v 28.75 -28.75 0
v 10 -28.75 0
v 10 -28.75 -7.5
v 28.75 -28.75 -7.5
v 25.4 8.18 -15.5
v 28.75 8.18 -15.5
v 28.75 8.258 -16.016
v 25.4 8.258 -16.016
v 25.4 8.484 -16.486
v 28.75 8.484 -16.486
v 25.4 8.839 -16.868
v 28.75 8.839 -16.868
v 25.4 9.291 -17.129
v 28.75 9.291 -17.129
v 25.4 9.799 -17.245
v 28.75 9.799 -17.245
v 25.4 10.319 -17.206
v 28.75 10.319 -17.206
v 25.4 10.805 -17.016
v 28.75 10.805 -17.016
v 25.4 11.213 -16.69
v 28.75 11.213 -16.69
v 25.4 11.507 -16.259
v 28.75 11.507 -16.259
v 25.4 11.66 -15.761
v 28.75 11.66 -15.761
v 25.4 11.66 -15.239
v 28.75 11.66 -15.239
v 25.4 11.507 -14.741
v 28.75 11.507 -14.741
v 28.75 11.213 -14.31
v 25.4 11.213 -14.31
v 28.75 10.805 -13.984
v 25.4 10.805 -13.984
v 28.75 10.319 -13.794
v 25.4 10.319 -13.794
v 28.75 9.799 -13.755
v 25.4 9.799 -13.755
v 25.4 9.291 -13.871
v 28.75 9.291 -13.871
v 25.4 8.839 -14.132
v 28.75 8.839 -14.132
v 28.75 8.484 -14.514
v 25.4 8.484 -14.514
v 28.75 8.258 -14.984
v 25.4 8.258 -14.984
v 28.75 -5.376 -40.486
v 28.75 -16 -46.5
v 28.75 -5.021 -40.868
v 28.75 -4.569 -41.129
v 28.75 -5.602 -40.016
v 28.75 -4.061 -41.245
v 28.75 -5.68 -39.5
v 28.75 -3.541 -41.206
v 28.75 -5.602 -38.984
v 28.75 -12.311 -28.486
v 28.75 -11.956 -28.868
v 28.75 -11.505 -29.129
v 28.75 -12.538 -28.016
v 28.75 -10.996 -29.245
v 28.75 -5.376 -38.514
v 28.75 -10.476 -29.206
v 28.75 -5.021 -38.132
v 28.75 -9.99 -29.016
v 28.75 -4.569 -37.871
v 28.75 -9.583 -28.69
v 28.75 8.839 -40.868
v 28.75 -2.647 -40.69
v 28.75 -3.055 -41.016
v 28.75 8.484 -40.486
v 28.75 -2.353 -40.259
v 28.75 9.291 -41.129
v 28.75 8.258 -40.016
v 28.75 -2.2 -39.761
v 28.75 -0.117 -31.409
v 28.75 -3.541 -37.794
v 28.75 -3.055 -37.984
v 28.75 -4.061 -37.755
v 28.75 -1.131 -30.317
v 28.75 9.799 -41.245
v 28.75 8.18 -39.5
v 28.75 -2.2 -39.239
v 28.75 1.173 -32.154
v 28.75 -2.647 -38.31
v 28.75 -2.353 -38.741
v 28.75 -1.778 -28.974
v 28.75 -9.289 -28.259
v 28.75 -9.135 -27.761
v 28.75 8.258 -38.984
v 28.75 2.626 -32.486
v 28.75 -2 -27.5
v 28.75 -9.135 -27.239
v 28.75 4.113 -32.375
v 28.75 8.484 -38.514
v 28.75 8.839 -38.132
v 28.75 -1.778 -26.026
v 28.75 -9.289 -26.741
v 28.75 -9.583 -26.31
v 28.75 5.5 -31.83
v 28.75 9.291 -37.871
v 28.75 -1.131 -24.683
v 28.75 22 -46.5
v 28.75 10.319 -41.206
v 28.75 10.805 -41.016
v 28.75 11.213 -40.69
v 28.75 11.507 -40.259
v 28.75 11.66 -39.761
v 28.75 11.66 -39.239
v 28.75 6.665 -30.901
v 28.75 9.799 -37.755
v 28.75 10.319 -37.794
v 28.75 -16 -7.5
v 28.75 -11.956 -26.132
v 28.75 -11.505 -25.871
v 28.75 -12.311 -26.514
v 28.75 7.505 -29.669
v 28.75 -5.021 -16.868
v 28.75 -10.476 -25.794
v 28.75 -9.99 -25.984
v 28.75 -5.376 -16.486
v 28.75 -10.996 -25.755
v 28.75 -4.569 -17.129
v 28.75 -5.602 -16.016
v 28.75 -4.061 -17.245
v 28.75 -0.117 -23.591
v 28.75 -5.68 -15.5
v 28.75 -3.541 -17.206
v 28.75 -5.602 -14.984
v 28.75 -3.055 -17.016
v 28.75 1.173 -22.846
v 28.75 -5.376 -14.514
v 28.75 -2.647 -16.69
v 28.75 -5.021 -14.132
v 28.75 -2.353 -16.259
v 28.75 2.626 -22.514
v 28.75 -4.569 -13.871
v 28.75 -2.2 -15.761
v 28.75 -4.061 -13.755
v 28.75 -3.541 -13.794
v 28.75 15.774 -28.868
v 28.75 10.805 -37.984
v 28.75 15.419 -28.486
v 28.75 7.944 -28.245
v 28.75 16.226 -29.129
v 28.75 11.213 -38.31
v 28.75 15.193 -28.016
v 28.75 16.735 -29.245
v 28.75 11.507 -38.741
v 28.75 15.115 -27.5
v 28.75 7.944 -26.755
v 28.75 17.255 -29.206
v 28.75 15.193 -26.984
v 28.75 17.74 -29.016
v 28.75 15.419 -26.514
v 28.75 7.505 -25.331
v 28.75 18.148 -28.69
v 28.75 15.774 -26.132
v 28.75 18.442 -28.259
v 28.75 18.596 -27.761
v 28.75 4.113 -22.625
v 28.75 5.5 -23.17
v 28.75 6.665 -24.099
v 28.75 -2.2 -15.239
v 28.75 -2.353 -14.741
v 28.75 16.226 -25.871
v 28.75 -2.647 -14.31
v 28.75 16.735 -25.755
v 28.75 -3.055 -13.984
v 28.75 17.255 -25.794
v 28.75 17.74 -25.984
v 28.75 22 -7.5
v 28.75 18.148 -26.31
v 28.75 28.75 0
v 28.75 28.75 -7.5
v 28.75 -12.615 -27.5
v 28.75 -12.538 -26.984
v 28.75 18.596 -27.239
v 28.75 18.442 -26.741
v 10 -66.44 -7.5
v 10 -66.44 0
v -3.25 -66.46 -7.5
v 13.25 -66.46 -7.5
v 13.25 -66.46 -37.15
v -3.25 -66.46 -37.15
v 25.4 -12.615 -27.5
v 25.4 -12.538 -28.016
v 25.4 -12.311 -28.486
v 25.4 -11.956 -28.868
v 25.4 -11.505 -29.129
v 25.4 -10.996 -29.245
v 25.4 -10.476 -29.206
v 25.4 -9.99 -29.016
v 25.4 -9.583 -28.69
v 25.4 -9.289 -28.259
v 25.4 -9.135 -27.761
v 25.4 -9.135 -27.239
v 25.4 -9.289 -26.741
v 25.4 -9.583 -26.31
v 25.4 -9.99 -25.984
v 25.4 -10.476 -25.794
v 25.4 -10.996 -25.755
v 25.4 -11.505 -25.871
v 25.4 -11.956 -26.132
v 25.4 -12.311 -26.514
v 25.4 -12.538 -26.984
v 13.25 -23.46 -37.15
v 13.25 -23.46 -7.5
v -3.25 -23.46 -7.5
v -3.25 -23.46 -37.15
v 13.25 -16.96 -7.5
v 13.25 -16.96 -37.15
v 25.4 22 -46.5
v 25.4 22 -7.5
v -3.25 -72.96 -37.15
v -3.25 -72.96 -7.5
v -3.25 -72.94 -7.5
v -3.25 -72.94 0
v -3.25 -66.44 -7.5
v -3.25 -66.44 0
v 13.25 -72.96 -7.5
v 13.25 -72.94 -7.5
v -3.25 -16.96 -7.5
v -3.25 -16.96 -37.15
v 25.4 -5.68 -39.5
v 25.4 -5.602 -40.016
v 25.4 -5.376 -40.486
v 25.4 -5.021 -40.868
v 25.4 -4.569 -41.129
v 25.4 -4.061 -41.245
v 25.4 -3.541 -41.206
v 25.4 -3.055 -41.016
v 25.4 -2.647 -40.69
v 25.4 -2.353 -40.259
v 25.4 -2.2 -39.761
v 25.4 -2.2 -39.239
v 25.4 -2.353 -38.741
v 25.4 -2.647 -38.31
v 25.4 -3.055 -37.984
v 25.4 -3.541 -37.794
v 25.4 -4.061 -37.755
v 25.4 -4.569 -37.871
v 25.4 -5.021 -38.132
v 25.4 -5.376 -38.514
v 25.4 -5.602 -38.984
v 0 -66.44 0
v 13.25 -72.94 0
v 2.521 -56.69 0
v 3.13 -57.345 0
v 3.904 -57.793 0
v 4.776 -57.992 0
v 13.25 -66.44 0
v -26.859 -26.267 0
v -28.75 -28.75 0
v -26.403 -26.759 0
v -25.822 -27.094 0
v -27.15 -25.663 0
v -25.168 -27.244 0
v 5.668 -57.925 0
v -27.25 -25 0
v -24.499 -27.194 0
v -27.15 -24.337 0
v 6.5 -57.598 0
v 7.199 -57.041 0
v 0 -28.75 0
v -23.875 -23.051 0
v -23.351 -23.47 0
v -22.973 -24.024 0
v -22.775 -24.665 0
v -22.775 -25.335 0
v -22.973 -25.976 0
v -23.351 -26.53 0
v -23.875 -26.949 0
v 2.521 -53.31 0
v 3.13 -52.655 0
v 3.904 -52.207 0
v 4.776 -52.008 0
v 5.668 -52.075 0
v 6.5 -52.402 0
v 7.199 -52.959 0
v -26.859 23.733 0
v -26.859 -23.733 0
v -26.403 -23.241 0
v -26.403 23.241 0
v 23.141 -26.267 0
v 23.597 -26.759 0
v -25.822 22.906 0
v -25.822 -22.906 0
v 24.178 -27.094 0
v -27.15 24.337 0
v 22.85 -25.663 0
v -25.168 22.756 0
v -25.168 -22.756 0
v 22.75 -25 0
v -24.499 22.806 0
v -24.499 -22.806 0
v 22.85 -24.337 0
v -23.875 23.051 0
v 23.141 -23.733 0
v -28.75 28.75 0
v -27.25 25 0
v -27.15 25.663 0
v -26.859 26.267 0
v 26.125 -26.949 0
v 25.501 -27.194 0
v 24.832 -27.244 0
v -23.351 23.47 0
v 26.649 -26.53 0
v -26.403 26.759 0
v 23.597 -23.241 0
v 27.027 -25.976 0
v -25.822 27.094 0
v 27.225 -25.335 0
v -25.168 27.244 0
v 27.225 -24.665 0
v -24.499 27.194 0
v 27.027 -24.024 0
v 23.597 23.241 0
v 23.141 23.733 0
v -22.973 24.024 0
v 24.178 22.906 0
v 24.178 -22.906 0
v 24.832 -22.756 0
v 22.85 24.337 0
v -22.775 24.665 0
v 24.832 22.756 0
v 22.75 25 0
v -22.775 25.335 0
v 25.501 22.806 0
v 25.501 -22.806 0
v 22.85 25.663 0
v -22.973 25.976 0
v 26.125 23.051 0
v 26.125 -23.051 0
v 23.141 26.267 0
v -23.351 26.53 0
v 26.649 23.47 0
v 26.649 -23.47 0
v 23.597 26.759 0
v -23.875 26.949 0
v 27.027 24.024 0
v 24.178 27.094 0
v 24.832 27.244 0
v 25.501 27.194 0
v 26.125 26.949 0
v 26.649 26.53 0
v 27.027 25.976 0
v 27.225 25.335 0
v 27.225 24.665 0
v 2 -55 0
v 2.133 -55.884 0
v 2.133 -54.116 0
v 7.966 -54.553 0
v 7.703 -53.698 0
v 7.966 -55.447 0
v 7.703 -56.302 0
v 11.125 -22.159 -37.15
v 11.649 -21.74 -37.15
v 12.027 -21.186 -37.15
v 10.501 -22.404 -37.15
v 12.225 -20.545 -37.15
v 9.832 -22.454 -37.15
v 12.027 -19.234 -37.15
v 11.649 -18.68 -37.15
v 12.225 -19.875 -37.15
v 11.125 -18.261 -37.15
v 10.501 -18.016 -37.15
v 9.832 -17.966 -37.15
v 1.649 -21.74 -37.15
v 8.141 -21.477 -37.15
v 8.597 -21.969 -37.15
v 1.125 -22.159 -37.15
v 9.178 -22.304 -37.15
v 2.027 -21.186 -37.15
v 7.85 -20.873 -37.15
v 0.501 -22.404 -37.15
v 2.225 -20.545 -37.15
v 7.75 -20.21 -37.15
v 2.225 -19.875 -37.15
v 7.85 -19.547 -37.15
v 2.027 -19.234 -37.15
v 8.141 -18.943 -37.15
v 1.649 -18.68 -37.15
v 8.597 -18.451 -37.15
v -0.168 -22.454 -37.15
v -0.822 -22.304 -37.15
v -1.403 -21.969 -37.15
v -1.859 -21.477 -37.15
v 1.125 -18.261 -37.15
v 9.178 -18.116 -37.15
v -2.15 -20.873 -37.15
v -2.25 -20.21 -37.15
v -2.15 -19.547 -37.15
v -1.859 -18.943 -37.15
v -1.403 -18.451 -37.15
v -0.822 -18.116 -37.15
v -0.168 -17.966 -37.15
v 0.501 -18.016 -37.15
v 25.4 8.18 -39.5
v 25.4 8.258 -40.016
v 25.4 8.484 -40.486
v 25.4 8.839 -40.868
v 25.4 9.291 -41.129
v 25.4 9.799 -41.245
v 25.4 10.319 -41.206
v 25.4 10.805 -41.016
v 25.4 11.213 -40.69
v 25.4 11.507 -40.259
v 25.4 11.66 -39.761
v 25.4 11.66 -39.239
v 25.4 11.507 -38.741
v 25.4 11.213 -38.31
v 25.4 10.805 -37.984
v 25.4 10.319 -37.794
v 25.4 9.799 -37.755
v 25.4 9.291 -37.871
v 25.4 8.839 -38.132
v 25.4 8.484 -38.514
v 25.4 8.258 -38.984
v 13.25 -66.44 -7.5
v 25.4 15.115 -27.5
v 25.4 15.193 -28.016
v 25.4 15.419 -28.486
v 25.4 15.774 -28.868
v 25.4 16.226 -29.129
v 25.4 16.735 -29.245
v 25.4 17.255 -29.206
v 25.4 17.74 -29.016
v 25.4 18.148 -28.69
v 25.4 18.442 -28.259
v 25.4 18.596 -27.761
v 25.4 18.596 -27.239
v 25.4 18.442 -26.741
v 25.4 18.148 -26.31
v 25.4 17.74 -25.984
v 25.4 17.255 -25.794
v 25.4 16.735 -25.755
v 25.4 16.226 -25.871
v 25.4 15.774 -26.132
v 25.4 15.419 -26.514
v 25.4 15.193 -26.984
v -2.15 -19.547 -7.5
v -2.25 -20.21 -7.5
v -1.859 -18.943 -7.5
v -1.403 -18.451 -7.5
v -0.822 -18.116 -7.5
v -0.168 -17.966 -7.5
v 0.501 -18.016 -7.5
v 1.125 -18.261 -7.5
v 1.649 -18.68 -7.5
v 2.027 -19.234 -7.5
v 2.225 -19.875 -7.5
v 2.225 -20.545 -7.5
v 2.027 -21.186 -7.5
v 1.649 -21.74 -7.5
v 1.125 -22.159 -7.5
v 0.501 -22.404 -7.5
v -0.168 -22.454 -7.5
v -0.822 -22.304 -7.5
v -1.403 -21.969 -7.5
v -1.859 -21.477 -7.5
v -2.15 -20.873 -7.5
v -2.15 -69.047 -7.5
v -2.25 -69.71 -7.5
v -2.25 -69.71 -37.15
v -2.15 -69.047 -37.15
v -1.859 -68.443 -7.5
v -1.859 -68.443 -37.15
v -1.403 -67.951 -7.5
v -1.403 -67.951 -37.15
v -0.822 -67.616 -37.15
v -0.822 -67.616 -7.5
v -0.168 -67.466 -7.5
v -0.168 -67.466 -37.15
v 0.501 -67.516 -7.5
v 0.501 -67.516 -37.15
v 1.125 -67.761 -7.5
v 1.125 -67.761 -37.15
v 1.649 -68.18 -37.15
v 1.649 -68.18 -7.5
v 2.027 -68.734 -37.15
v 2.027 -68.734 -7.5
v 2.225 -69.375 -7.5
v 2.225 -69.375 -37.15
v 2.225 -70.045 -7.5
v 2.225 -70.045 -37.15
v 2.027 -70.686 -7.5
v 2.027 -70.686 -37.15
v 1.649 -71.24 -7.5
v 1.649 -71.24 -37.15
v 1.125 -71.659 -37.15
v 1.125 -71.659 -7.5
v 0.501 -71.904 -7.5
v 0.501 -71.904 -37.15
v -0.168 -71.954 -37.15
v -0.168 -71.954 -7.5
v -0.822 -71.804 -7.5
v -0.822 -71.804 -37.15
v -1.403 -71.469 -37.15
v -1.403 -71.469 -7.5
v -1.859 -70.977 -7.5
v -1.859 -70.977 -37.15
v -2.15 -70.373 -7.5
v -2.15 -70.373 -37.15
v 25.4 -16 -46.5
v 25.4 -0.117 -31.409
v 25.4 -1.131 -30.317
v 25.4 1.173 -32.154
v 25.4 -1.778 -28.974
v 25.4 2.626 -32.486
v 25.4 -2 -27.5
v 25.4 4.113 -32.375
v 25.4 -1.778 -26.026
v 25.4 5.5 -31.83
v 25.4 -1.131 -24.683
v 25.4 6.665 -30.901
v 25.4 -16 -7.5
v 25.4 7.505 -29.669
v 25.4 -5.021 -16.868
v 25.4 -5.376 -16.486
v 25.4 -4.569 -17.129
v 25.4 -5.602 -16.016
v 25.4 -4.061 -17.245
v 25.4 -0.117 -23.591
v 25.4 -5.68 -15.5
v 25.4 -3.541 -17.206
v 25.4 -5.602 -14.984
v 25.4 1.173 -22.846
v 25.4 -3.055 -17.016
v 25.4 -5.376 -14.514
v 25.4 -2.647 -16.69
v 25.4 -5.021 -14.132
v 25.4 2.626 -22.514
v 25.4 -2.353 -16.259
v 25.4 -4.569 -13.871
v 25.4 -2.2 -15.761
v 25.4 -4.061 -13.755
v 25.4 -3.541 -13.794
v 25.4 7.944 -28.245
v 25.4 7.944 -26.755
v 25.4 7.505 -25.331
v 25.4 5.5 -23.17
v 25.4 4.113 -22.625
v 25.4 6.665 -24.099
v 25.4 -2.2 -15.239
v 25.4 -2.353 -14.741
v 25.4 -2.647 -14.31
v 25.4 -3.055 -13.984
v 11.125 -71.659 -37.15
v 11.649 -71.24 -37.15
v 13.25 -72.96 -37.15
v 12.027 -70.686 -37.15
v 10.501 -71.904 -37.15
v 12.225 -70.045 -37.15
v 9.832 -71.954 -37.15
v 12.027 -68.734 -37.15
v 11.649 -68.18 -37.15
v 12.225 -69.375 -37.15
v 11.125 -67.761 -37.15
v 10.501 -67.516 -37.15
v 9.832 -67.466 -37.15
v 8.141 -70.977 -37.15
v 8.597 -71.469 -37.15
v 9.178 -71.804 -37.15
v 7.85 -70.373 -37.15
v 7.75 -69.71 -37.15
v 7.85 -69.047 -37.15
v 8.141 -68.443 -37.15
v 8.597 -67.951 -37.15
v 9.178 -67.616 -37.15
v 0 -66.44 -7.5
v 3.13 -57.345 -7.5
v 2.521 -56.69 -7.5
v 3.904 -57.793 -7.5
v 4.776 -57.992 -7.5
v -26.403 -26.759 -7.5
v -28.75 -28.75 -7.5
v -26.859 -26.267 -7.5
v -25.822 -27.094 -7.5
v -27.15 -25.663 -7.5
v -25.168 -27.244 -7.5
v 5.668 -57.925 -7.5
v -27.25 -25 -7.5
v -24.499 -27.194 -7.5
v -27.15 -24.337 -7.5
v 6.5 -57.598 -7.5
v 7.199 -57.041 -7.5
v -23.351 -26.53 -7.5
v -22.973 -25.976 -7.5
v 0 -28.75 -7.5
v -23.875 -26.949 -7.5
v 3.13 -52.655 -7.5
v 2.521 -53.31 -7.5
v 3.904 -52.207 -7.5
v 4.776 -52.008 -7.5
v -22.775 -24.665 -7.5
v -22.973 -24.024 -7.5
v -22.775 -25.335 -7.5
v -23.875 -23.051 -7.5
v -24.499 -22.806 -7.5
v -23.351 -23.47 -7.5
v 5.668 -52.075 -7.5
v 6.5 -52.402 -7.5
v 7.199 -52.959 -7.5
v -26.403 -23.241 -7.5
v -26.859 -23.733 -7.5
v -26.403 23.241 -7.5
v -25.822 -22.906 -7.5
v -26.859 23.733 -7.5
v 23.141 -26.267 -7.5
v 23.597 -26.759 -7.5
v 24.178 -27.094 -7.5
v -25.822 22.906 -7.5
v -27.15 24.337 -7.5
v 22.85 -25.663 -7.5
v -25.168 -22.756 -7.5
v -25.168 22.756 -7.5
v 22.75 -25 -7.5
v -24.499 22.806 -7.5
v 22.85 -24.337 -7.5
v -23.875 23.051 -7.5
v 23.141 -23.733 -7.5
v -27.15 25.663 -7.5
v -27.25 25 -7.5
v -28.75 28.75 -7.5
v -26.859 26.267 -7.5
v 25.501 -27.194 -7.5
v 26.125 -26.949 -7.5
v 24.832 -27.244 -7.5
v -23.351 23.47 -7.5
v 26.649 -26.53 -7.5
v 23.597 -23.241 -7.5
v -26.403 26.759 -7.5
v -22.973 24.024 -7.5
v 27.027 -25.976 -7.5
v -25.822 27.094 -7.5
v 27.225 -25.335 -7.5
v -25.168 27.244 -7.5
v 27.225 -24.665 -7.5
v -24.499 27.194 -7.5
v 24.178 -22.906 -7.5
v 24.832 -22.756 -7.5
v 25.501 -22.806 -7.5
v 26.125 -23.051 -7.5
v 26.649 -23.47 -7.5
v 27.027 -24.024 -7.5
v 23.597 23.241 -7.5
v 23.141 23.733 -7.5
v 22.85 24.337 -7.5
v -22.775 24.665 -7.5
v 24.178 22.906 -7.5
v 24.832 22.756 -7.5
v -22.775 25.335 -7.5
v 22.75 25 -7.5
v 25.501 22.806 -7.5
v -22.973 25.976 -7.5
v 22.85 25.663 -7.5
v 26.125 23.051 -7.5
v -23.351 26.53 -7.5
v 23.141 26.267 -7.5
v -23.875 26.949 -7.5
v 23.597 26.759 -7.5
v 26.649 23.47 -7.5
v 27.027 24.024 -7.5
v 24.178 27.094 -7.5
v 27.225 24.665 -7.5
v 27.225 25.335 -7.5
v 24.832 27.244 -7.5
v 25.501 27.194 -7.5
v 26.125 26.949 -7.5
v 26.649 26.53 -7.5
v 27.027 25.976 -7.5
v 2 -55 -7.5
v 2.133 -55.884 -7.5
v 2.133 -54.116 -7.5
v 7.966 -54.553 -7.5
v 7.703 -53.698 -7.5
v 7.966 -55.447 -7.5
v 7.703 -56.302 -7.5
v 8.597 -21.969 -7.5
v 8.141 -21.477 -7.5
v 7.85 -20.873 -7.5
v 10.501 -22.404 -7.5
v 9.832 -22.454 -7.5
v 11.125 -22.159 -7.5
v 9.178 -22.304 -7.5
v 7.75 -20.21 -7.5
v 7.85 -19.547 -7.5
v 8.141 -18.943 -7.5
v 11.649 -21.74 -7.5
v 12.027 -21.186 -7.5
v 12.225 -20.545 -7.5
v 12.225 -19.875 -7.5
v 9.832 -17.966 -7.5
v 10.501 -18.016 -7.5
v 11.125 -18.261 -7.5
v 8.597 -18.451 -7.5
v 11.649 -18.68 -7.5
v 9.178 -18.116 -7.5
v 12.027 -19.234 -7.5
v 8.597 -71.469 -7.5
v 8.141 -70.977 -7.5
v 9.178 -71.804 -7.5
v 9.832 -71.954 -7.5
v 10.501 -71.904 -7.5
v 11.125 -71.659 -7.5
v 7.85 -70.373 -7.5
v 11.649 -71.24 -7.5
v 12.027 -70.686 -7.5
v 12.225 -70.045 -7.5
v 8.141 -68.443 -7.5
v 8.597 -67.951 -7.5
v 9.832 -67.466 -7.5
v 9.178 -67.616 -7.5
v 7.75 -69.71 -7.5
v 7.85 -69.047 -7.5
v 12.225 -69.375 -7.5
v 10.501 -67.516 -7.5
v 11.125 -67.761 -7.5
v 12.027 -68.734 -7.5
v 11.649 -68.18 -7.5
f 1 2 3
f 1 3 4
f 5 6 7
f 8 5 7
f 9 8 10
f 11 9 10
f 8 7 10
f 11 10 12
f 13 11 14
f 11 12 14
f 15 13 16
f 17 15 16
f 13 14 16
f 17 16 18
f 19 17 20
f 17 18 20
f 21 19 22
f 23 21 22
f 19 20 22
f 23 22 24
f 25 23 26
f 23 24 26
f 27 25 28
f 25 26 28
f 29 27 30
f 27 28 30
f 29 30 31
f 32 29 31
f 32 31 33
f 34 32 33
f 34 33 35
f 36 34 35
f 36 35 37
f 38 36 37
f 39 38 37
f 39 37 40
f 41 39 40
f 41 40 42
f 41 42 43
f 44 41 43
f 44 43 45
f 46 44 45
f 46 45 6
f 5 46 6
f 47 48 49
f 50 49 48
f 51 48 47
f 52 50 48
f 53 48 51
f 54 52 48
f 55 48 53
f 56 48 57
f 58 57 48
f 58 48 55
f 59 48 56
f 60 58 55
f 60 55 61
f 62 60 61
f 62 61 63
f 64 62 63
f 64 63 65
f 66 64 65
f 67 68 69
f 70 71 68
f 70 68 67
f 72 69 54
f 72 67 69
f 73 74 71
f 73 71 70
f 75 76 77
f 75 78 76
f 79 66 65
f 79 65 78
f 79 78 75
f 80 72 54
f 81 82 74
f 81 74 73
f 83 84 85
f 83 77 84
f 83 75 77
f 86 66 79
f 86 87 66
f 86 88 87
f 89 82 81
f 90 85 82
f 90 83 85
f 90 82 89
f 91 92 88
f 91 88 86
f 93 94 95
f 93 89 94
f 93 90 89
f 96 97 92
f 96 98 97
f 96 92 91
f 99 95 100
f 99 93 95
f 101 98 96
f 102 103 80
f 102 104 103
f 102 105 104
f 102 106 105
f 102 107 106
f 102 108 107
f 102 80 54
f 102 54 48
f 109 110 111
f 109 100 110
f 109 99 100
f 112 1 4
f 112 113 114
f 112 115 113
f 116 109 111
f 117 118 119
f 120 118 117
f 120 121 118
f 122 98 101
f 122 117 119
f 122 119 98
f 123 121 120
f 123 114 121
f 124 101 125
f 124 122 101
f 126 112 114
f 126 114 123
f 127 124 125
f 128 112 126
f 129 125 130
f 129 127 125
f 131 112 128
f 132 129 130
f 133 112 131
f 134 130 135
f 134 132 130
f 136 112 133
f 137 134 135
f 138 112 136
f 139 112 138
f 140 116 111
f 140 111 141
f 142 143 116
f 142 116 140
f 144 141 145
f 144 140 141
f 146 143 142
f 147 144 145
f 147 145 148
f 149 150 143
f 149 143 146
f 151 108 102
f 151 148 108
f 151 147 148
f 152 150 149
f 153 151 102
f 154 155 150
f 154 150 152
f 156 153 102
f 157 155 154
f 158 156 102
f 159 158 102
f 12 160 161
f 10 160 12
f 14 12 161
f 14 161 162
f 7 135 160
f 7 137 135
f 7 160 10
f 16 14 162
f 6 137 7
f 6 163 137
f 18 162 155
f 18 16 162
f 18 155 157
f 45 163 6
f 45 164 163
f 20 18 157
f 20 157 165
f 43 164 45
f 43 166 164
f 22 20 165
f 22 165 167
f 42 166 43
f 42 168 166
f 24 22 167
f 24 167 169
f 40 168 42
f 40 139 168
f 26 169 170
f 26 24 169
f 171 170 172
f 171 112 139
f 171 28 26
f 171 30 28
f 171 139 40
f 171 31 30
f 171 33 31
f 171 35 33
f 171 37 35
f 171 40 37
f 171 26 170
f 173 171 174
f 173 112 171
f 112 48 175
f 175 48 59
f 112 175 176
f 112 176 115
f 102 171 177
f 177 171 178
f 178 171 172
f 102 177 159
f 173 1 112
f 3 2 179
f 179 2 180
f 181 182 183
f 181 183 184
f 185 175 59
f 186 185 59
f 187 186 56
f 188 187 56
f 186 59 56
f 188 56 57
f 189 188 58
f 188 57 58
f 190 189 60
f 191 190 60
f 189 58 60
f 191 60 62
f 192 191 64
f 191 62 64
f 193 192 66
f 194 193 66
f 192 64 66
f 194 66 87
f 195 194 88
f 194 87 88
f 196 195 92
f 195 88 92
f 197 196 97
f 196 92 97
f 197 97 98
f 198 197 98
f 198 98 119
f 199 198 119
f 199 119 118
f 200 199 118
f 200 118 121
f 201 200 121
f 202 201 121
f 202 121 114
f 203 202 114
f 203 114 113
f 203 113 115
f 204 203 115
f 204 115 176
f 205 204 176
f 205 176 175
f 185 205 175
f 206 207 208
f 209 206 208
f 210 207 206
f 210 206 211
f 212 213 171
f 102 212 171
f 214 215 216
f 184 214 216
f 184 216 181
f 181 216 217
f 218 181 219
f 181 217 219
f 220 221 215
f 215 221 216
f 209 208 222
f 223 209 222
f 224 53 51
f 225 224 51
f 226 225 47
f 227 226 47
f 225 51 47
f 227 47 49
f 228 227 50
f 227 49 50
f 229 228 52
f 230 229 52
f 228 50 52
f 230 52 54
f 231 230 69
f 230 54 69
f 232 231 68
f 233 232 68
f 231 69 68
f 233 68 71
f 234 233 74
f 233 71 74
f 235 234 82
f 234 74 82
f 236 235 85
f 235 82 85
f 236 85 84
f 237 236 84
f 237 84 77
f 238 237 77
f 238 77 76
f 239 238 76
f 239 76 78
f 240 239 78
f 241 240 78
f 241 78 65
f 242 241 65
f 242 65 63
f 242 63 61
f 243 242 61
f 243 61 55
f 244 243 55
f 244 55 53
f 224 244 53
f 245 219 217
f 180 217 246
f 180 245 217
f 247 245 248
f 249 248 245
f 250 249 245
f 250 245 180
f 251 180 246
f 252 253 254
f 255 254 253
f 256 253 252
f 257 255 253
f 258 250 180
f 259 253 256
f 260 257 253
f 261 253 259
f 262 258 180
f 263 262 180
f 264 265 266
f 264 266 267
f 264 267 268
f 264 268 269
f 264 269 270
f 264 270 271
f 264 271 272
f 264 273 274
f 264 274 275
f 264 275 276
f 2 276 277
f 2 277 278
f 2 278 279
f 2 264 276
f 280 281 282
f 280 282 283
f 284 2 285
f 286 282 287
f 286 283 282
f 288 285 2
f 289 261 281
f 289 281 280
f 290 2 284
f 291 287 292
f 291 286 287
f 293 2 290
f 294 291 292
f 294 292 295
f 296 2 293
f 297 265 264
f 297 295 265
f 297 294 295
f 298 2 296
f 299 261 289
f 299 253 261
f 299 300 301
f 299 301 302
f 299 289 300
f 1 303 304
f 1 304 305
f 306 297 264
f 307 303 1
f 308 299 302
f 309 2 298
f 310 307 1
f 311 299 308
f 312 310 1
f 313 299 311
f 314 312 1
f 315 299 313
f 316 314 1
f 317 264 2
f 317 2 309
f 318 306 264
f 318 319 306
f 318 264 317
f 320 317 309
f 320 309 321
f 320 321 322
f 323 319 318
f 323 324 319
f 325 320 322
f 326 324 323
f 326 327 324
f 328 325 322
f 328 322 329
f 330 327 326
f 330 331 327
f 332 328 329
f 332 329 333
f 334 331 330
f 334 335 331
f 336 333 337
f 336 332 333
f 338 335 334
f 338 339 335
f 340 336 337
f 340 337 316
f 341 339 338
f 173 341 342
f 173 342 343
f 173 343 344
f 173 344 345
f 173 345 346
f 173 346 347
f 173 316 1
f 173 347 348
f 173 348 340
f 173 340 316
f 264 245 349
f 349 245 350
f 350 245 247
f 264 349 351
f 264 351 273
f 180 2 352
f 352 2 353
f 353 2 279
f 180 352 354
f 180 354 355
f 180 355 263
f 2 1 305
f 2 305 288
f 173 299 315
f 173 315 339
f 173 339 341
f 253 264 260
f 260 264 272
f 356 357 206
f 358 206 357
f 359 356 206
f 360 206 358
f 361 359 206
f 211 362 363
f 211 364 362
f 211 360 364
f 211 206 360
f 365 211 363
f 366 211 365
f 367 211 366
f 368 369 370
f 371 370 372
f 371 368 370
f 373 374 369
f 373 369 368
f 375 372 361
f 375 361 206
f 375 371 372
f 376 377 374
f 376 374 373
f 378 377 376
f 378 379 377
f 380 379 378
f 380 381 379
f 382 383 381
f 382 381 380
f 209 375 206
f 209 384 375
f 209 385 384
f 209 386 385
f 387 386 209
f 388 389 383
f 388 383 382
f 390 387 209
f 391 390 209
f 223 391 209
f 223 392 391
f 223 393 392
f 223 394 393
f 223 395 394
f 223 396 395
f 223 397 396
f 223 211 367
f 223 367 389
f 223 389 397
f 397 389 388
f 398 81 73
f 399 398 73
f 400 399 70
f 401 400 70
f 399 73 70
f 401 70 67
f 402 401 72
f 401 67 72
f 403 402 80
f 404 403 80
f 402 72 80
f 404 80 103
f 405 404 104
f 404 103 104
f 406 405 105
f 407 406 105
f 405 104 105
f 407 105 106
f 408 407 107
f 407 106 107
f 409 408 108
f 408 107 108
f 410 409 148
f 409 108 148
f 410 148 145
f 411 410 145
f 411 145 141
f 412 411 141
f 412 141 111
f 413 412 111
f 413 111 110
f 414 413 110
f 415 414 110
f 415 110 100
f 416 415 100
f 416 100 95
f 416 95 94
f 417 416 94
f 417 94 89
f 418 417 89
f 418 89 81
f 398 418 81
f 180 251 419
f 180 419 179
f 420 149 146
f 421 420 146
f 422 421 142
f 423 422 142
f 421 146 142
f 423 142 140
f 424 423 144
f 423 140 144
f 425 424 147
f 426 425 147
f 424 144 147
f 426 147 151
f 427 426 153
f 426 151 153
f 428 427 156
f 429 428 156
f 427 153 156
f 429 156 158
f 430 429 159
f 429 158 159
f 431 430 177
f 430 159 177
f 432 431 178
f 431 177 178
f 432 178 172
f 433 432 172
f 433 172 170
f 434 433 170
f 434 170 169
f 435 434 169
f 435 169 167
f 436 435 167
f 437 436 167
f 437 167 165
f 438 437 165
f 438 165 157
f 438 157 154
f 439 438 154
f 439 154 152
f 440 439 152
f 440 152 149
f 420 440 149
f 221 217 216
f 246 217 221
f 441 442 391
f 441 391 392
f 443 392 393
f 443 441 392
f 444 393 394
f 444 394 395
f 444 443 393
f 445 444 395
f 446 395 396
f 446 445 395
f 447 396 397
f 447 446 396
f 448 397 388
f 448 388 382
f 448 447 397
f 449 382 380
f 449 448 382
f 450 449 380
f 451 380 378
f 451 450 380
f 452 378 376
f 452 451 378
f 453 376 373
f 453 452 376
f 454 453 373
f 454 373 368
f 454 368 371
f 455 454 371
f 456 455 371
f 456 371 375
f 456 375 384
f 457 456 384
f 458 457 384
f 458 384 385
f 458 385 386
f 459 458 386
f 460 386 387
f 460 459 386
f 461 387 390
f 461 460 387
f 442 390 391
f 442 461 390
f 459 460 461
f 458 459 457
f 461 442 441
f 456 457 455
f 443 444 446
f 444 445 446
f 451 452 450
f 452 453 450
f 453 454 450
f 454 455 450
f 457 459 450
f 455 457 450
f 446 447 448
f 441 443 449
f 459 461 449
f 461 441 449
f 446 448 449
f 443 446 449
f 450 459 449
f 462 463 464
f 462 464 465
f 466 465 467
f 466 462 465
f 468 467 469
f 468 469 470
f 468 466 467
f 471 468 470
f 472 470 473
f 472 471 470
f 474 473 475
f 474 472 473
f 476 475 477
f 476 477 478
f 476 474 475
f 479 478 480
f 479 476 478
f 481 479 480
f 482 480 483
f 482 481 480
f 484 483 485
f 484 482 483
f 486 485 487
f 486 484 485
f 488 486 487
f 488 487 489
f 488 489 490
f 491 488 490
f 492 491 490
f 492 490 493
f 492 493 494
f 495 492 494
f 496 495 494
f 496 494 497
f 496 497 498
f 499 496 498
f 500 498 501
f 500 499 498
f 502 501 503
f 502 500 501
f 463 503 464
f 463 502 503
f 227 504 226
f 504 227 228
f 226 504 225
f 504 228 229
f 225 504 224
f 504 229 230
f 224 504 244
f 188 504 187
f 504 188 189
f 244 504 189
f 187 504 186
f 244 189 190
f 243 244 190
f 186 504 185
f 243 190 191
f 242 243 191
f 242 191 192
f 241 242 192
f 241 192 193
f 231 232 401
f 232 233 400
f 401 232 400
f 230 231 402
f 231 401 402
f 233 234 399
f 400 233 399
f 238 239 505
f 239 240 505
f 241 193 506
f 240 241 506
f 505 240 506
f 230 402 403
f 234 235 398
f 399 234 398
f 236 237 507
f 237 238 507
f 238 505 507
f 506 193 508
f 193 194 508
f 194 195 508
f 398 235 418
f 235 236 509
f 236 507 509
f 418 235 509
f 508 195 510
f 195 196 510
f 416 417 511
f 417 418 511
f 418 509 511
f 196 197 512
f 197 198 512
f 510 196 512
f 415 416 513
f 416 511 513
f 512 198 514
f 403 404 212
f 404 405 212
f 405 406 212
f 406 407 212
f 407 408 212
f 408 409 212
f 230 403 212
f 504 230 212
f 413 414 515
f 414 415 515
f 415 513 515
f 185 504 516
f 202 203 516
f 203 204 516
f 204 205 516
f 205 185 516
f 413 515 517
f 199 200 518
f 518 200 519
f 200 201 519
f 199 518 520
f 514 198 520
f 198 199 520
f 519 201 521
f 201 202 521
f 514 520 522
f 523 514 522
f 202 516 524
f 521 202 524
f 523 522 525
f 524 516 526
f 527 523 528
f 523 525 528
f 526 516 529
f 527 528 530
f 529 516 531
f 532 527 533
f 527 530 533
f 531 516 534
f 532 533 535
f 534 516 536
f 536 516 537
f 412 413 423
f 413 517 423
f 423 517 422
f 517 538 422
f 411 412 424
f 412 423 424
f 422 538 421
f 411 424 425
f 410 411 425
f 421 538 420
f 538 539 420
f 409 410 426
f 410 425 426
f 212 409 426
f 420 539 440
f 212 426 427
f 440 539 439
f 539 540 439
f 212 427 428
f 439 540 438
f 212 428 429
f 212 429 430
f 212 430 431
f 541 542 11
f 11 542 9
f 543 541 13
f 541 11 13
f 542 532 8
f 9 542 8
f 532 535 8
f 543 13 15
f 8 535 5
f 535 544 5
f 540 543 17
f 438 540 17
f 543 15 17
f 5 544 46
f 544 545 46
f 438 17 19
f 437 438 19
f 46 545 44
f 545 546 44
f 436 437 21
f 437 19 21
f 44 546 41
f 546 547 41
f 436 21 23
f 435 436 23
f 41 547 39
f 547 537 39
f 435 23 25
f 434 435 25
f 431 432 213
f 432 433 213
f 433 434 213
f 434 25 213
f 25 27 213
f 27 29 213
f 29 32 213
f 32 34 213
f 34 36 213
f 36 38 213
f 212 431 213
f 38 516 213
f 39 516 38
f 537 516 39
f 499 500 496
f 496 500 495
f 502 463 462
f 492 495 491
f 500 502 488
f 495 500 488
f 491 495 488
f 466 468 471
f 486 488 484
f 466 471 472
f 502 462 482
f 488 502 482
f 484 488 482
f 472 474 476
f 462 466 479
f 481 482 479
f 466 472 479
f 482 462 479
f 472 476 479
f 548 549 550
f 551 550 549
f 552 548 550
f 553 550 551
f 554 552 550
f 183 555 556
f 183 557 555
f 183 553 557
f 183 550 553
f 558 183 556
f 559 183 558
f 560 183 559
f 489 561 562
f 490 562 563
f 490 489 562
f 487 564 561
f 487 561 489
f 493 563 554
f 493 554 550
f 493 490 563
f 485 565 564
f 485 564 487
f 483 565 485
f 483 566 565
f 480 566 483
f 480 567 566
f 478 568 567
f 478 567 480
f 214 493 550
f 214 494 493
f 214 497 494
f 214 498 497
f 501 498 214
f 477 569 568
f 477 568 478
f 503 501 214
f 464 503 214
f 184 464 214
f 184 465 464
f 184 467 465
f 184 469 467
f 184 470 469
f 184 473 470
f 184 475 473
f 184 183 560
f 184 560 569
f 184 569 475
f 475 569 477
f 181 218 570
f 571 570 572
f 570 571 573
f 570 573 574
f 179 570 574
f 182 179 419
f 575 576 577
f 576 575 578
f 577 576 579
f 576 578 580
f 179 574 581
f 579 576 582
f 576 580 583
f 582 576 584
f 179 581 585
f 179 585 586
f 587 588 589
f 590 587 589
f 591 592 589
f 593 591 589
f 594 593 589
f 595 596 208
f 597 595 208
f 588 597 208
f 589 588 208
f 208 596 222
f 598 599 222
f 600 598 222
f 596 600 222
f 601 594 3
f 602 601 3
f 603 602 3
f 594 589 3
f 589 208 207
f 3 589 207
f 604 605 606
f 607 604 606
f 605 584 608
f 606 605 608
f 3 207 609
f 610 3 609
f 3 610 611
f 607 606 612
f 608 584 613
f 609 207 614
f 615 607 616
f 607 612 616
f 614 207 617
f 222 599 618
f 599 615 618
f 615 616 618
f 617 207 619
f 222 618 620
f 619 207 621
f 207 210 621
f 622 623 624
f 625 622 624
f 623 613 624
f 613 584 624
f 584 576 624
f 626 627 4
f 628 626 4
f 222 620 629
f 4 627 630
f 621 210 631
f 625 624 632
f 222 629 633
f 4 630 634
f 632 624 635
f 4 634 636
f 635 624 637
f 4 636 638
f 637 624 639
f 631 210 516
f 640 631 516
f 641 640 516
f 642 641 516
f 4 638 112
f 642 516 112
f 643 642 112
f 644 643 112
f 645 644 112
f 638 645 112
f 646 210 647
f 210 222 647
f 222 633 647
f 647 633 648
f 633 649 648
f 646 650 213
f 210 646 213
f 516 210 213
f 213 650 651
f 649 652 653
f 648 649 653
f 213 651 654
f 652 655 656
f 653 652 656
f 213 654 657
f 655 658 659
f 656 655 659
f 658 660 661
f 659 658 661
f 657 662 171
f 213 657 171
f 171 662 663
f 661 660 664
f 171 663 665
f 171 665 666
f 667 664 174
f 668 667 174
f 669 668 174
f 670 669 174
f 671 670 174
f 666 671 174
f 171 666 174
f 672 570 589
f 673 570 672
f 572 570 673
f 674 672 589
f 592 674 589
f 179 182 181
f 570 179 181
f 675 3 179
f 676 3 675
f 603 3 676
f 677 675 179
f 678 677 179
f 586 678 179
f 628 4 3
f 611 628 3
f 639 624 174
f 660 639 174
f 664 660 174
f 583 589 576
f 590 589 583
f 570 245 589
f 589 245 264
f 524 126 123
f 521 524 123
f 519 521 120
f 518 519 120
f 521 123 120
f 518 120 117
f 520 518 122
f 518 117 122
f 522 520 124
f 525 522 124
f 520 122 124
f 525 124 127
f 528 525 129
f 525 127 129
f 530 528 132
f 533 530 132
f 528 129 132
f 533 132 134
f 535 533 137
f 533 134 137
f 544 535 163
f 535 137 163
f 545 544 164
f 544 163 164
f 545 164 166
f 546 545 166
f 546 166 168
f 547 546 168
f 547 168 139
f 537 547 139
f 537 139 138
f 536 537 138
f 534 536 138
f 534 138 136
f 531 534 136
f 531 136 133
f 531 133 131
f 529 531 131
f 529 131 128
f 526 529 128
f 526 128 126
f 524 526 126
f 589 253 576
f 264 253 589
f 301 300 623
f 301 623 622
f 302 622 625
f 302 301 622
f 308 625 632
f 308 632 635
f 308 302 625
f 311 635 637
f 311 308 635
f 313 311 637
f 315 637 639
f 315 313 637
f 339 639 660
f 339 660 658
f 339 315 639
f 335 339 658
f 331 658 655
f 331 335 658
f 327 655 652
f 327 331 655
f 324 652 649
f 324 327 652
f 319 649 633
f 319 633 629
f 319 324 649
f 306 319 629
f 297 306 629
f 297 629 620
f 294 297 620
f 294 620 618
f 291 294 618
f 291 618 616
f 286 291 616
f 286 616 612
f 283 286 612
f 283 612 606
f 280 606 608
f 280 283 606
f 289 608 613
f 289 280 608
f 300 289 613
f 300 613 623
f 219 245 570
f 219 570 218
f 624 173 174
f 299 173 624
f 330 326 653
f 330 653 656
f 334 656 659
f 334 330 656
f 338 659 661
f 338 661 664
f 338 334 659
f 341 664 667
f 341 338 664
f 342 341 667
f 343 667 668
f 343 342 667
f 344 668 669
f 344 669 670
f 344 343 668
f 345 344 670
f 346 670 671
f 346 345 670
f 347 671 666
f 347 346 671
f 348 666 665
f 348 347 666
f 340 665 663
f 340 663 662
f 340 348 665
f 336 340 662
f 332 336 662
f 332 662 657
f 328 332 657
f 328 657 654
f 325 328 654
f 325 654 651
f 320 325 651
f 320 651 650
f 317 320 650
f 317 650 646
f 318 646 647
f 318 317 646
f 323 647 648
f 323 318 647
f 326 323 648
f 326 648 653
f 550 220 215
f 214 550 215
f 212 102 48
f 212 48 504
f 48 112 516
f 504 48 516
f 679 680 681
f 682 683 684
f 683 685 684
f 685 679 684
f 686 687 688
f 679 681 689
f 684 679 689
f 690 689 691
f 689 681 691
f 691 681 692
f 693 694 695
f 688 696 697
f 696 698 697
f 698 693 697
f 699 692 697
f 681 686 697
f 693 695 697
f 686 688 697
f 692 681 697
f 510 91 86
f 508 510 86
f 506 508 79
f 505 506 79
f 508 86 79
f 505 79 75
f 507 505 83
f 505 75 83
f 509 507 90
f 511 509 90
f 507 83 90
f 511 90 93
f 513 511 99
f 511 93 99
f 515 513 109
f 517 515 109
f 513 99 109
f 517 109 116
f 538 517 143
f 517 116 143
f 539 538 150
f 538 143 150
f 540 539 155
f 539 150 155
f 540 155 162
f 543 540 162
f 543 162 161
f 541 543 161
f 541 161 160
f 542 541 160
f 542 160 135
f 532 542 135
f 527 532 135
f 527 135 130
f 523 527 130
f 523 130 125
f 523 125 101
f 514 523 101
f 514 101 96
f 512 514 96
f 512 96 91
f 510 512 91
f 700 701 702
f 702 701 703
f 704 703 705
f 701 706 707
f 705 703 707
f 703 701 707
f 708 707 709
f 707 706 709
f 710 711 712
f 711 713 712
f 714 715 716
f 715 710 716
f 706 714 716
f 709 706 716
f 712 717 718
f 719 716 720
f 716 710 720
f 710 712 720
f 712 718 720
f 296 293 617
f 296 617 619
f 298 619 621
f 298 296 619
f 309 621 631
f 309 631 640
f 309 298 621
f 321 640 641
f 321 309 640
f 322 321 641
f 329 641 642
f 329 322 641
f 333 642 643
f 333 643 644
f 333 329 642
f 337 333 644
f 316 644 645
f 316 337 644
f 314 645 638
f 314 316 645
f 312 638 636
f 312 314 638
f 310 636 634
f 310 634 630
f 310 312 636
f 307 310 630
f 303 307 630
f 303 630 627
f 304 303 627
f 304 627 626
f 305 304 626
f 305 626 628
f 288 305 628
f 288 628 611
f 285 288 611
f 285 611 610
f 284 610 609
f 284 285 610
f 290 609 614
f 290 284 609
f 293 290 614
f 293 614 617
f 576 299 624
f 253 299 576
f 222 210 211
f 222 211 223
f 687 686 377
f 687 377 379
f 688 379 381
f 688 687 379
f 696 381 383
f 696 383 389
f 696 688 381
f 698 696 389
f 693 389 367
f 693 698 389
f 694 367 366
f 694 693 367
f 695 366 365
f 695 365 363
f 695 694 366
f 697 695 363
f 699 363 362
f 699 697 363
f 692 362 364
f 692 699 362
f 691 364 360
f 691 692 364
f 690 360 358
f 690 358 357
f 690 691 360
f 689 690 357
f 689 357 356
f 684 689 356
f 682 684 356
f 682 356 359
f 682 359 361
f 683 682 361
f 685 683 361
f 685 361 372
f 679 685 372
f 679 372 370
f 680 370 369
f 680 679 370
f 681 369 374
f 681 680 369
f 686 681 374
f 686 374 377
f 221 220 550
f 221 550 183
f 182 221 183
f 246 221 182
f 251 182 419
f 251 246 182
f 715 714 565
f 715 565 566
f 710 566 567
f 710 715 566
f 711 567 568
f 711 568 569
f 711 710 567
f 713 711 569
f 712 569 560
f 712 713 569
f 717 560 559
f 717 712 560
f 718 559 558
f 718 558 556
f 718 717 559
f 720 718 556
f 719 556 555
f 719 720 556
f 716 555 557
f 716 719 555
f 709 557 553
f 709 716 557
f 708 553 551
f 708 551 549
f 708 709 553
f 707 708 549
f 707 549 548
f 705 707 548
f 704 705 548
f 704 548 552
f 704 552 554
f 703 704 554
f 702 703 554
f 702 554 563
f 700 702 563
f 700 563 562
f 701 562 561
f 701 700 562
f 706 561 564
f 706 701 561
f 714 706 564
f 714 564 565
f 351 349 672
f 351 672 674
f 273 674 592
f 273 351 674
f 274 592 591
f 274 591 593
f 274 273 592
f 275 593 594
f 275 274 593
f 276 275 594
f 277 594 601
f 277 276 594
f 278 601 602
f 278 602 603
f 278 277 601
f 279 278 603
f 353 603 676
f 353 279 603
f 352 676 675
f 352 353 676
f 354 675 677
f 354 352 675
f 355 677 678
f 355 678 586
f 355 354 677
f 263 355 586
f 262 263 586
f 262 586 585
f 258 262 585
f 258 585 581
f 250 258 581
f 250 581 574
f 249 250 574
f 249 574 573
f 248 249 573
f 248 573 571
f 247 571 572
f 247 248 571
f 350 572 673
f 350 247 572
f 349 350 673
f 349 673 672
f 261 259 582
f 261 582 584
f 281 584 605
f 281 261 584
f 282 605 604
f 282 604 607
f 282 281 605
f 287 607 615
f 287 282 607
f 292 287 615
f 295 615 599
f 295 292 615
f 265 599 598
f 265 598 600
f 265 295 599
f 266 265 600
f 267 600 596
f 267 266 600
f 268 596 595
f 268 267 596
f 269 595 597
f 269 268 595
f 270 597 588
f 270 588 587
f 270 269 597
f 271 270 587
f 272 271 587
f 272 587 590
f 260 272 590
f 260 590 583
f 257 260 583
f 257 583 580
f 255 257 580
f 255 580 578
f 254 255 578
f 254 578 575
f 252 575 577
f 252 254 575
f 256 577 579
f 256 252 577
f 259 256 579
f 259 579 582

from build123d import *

# Parameters (mm, degrees)
SKETCH014_R             = 3
SKETCH014_R_2           = 2.25
PAD007_DEPTH            = 7.5
SKETCH015_W             = 16.5
SKETCH015_H             = 6.5
SKETCH015_R             = 2.25
PAD008_DEPTH            = 29.65
PAD010_DEPTH            = 39
SKETCH017_R             = 5
SKETCH017_R_2           = 1.75
POCKET_DEPTH            = 5
BODY002_PLACEMENT_ANGLE = 180


with BuildPart() as part:
    # Sketch014 → Pad007 (new body)
    with BuildSketch(Plane.XY):
        Polygon((0, -28.75), (0, -55), (0, -66.44), (3.25, -66.44), (3.25, -72.94), (-13.25, -72.94), (-13.25, -66.44), (-10, -66.44), (-10, -55), (-10, -28.75), (-28.75, -28.75), (-28.75, 28.75), (28.75, 28.75), (28.75, -28.75), align=None)
        with Locations((-5, -55)):
            Circle(SKETCH014_R, mode=Mode.SUBTRACT)
        with Locations((-25, -25)):
            Circle(SKETCH014_R_2, mode=Mode.SUBTRACT)
        with Locations((25, 25)):
            Circle(SKETCH014_R_2, mode=Mode.SUBTRACT)
        with Locations((25, -25)):
            Circle(SKETCH014_R_2, mode=Mode.SUBTRACT)
        with Locations((-25, 25)):
            Circle(SKETCH014_R_2, mode=Mode.SUBTRACT)
    extrude(amount=PAD007_DEPTH)

    # Sketch015 (on Face21 of Pad007) → Pad008 (join)
    with BuildSketch(Plane.XY.offset(7.5)):
        with Locations((-5, -20.21)):
            Rectangle(SKETCH015_W, SKETCH015_H)
        with Locations((-10, -20.21)):
            Circle(SKETCH015_R, mode=Mode.SUBTRACT)
        with Locations((0, -20.21)):
            Circle(SKETCH015_R, mode=Mode.SUBTRACT)
        with Locations((-5, -69.71)):
            Rectangle(SKETCH015_W, SKETCH015_H)
        with Locations((0, -69.71)):
            Circle(SKETCH015_R, mode=Mode.SUBTRACT)
        with Locations((-10, -69.71)):
            Circle(SKETCH015_R, mode=Mode.SUBTRACT)
    extrude(amount=PAD008_DEPTH)

    # Sketch016 (on Face5 of Pad008) → Pad010 (join)
    with BuildSketch(Plane.XY.offset(7.5)):
        Polygon((-25.4, 3), (-25.4, 22), (-28.75, 22), (-28.75, -16), (-25.4, -16), align=None)
    extrude(amount=PAD010_DEPTH)

    # Sketch017 (on Face7 of Pad010) → Pocket (cut)
    with BuildSketch(Plane(origin=(-28.75, 0, 0), x_dir=(0, -1, 0), z_dir=(-1, 0, 0))):
        with Locations((-3, 27.5)):
            Circle(SKETCH017_R)
        with Locations((3.93, 39.5)):
            Circle(SKETCH017_R_2)
        with Locations((-9.93, 39.5)):
            Circle(SKETCH017_R_2)
        with Locations((-9.93, 15.5)):
            Circle(SKETCH017_R_2)
        with Locations((3.93, 15.5)):
            Circle(SKETCH017_R_2)
        with Locations((-16.865388, 27.5)):
            Circle(SKETCH017_R_2)
        with Locations((10.865388, 27.5)):
            Circle(SKETCH017_R_2)
    extrude(amount=-POCKET_DEPTH, mode=Mode.SUBTRACT)


with BuildPart() as part_1:
    # Body002 placement: moved
    add(part.part.rotate(Axis((0, 0, 0), (0, 1, 0)), BODY002_PLACEMENT_ANGLE))


solid = part_1.part
